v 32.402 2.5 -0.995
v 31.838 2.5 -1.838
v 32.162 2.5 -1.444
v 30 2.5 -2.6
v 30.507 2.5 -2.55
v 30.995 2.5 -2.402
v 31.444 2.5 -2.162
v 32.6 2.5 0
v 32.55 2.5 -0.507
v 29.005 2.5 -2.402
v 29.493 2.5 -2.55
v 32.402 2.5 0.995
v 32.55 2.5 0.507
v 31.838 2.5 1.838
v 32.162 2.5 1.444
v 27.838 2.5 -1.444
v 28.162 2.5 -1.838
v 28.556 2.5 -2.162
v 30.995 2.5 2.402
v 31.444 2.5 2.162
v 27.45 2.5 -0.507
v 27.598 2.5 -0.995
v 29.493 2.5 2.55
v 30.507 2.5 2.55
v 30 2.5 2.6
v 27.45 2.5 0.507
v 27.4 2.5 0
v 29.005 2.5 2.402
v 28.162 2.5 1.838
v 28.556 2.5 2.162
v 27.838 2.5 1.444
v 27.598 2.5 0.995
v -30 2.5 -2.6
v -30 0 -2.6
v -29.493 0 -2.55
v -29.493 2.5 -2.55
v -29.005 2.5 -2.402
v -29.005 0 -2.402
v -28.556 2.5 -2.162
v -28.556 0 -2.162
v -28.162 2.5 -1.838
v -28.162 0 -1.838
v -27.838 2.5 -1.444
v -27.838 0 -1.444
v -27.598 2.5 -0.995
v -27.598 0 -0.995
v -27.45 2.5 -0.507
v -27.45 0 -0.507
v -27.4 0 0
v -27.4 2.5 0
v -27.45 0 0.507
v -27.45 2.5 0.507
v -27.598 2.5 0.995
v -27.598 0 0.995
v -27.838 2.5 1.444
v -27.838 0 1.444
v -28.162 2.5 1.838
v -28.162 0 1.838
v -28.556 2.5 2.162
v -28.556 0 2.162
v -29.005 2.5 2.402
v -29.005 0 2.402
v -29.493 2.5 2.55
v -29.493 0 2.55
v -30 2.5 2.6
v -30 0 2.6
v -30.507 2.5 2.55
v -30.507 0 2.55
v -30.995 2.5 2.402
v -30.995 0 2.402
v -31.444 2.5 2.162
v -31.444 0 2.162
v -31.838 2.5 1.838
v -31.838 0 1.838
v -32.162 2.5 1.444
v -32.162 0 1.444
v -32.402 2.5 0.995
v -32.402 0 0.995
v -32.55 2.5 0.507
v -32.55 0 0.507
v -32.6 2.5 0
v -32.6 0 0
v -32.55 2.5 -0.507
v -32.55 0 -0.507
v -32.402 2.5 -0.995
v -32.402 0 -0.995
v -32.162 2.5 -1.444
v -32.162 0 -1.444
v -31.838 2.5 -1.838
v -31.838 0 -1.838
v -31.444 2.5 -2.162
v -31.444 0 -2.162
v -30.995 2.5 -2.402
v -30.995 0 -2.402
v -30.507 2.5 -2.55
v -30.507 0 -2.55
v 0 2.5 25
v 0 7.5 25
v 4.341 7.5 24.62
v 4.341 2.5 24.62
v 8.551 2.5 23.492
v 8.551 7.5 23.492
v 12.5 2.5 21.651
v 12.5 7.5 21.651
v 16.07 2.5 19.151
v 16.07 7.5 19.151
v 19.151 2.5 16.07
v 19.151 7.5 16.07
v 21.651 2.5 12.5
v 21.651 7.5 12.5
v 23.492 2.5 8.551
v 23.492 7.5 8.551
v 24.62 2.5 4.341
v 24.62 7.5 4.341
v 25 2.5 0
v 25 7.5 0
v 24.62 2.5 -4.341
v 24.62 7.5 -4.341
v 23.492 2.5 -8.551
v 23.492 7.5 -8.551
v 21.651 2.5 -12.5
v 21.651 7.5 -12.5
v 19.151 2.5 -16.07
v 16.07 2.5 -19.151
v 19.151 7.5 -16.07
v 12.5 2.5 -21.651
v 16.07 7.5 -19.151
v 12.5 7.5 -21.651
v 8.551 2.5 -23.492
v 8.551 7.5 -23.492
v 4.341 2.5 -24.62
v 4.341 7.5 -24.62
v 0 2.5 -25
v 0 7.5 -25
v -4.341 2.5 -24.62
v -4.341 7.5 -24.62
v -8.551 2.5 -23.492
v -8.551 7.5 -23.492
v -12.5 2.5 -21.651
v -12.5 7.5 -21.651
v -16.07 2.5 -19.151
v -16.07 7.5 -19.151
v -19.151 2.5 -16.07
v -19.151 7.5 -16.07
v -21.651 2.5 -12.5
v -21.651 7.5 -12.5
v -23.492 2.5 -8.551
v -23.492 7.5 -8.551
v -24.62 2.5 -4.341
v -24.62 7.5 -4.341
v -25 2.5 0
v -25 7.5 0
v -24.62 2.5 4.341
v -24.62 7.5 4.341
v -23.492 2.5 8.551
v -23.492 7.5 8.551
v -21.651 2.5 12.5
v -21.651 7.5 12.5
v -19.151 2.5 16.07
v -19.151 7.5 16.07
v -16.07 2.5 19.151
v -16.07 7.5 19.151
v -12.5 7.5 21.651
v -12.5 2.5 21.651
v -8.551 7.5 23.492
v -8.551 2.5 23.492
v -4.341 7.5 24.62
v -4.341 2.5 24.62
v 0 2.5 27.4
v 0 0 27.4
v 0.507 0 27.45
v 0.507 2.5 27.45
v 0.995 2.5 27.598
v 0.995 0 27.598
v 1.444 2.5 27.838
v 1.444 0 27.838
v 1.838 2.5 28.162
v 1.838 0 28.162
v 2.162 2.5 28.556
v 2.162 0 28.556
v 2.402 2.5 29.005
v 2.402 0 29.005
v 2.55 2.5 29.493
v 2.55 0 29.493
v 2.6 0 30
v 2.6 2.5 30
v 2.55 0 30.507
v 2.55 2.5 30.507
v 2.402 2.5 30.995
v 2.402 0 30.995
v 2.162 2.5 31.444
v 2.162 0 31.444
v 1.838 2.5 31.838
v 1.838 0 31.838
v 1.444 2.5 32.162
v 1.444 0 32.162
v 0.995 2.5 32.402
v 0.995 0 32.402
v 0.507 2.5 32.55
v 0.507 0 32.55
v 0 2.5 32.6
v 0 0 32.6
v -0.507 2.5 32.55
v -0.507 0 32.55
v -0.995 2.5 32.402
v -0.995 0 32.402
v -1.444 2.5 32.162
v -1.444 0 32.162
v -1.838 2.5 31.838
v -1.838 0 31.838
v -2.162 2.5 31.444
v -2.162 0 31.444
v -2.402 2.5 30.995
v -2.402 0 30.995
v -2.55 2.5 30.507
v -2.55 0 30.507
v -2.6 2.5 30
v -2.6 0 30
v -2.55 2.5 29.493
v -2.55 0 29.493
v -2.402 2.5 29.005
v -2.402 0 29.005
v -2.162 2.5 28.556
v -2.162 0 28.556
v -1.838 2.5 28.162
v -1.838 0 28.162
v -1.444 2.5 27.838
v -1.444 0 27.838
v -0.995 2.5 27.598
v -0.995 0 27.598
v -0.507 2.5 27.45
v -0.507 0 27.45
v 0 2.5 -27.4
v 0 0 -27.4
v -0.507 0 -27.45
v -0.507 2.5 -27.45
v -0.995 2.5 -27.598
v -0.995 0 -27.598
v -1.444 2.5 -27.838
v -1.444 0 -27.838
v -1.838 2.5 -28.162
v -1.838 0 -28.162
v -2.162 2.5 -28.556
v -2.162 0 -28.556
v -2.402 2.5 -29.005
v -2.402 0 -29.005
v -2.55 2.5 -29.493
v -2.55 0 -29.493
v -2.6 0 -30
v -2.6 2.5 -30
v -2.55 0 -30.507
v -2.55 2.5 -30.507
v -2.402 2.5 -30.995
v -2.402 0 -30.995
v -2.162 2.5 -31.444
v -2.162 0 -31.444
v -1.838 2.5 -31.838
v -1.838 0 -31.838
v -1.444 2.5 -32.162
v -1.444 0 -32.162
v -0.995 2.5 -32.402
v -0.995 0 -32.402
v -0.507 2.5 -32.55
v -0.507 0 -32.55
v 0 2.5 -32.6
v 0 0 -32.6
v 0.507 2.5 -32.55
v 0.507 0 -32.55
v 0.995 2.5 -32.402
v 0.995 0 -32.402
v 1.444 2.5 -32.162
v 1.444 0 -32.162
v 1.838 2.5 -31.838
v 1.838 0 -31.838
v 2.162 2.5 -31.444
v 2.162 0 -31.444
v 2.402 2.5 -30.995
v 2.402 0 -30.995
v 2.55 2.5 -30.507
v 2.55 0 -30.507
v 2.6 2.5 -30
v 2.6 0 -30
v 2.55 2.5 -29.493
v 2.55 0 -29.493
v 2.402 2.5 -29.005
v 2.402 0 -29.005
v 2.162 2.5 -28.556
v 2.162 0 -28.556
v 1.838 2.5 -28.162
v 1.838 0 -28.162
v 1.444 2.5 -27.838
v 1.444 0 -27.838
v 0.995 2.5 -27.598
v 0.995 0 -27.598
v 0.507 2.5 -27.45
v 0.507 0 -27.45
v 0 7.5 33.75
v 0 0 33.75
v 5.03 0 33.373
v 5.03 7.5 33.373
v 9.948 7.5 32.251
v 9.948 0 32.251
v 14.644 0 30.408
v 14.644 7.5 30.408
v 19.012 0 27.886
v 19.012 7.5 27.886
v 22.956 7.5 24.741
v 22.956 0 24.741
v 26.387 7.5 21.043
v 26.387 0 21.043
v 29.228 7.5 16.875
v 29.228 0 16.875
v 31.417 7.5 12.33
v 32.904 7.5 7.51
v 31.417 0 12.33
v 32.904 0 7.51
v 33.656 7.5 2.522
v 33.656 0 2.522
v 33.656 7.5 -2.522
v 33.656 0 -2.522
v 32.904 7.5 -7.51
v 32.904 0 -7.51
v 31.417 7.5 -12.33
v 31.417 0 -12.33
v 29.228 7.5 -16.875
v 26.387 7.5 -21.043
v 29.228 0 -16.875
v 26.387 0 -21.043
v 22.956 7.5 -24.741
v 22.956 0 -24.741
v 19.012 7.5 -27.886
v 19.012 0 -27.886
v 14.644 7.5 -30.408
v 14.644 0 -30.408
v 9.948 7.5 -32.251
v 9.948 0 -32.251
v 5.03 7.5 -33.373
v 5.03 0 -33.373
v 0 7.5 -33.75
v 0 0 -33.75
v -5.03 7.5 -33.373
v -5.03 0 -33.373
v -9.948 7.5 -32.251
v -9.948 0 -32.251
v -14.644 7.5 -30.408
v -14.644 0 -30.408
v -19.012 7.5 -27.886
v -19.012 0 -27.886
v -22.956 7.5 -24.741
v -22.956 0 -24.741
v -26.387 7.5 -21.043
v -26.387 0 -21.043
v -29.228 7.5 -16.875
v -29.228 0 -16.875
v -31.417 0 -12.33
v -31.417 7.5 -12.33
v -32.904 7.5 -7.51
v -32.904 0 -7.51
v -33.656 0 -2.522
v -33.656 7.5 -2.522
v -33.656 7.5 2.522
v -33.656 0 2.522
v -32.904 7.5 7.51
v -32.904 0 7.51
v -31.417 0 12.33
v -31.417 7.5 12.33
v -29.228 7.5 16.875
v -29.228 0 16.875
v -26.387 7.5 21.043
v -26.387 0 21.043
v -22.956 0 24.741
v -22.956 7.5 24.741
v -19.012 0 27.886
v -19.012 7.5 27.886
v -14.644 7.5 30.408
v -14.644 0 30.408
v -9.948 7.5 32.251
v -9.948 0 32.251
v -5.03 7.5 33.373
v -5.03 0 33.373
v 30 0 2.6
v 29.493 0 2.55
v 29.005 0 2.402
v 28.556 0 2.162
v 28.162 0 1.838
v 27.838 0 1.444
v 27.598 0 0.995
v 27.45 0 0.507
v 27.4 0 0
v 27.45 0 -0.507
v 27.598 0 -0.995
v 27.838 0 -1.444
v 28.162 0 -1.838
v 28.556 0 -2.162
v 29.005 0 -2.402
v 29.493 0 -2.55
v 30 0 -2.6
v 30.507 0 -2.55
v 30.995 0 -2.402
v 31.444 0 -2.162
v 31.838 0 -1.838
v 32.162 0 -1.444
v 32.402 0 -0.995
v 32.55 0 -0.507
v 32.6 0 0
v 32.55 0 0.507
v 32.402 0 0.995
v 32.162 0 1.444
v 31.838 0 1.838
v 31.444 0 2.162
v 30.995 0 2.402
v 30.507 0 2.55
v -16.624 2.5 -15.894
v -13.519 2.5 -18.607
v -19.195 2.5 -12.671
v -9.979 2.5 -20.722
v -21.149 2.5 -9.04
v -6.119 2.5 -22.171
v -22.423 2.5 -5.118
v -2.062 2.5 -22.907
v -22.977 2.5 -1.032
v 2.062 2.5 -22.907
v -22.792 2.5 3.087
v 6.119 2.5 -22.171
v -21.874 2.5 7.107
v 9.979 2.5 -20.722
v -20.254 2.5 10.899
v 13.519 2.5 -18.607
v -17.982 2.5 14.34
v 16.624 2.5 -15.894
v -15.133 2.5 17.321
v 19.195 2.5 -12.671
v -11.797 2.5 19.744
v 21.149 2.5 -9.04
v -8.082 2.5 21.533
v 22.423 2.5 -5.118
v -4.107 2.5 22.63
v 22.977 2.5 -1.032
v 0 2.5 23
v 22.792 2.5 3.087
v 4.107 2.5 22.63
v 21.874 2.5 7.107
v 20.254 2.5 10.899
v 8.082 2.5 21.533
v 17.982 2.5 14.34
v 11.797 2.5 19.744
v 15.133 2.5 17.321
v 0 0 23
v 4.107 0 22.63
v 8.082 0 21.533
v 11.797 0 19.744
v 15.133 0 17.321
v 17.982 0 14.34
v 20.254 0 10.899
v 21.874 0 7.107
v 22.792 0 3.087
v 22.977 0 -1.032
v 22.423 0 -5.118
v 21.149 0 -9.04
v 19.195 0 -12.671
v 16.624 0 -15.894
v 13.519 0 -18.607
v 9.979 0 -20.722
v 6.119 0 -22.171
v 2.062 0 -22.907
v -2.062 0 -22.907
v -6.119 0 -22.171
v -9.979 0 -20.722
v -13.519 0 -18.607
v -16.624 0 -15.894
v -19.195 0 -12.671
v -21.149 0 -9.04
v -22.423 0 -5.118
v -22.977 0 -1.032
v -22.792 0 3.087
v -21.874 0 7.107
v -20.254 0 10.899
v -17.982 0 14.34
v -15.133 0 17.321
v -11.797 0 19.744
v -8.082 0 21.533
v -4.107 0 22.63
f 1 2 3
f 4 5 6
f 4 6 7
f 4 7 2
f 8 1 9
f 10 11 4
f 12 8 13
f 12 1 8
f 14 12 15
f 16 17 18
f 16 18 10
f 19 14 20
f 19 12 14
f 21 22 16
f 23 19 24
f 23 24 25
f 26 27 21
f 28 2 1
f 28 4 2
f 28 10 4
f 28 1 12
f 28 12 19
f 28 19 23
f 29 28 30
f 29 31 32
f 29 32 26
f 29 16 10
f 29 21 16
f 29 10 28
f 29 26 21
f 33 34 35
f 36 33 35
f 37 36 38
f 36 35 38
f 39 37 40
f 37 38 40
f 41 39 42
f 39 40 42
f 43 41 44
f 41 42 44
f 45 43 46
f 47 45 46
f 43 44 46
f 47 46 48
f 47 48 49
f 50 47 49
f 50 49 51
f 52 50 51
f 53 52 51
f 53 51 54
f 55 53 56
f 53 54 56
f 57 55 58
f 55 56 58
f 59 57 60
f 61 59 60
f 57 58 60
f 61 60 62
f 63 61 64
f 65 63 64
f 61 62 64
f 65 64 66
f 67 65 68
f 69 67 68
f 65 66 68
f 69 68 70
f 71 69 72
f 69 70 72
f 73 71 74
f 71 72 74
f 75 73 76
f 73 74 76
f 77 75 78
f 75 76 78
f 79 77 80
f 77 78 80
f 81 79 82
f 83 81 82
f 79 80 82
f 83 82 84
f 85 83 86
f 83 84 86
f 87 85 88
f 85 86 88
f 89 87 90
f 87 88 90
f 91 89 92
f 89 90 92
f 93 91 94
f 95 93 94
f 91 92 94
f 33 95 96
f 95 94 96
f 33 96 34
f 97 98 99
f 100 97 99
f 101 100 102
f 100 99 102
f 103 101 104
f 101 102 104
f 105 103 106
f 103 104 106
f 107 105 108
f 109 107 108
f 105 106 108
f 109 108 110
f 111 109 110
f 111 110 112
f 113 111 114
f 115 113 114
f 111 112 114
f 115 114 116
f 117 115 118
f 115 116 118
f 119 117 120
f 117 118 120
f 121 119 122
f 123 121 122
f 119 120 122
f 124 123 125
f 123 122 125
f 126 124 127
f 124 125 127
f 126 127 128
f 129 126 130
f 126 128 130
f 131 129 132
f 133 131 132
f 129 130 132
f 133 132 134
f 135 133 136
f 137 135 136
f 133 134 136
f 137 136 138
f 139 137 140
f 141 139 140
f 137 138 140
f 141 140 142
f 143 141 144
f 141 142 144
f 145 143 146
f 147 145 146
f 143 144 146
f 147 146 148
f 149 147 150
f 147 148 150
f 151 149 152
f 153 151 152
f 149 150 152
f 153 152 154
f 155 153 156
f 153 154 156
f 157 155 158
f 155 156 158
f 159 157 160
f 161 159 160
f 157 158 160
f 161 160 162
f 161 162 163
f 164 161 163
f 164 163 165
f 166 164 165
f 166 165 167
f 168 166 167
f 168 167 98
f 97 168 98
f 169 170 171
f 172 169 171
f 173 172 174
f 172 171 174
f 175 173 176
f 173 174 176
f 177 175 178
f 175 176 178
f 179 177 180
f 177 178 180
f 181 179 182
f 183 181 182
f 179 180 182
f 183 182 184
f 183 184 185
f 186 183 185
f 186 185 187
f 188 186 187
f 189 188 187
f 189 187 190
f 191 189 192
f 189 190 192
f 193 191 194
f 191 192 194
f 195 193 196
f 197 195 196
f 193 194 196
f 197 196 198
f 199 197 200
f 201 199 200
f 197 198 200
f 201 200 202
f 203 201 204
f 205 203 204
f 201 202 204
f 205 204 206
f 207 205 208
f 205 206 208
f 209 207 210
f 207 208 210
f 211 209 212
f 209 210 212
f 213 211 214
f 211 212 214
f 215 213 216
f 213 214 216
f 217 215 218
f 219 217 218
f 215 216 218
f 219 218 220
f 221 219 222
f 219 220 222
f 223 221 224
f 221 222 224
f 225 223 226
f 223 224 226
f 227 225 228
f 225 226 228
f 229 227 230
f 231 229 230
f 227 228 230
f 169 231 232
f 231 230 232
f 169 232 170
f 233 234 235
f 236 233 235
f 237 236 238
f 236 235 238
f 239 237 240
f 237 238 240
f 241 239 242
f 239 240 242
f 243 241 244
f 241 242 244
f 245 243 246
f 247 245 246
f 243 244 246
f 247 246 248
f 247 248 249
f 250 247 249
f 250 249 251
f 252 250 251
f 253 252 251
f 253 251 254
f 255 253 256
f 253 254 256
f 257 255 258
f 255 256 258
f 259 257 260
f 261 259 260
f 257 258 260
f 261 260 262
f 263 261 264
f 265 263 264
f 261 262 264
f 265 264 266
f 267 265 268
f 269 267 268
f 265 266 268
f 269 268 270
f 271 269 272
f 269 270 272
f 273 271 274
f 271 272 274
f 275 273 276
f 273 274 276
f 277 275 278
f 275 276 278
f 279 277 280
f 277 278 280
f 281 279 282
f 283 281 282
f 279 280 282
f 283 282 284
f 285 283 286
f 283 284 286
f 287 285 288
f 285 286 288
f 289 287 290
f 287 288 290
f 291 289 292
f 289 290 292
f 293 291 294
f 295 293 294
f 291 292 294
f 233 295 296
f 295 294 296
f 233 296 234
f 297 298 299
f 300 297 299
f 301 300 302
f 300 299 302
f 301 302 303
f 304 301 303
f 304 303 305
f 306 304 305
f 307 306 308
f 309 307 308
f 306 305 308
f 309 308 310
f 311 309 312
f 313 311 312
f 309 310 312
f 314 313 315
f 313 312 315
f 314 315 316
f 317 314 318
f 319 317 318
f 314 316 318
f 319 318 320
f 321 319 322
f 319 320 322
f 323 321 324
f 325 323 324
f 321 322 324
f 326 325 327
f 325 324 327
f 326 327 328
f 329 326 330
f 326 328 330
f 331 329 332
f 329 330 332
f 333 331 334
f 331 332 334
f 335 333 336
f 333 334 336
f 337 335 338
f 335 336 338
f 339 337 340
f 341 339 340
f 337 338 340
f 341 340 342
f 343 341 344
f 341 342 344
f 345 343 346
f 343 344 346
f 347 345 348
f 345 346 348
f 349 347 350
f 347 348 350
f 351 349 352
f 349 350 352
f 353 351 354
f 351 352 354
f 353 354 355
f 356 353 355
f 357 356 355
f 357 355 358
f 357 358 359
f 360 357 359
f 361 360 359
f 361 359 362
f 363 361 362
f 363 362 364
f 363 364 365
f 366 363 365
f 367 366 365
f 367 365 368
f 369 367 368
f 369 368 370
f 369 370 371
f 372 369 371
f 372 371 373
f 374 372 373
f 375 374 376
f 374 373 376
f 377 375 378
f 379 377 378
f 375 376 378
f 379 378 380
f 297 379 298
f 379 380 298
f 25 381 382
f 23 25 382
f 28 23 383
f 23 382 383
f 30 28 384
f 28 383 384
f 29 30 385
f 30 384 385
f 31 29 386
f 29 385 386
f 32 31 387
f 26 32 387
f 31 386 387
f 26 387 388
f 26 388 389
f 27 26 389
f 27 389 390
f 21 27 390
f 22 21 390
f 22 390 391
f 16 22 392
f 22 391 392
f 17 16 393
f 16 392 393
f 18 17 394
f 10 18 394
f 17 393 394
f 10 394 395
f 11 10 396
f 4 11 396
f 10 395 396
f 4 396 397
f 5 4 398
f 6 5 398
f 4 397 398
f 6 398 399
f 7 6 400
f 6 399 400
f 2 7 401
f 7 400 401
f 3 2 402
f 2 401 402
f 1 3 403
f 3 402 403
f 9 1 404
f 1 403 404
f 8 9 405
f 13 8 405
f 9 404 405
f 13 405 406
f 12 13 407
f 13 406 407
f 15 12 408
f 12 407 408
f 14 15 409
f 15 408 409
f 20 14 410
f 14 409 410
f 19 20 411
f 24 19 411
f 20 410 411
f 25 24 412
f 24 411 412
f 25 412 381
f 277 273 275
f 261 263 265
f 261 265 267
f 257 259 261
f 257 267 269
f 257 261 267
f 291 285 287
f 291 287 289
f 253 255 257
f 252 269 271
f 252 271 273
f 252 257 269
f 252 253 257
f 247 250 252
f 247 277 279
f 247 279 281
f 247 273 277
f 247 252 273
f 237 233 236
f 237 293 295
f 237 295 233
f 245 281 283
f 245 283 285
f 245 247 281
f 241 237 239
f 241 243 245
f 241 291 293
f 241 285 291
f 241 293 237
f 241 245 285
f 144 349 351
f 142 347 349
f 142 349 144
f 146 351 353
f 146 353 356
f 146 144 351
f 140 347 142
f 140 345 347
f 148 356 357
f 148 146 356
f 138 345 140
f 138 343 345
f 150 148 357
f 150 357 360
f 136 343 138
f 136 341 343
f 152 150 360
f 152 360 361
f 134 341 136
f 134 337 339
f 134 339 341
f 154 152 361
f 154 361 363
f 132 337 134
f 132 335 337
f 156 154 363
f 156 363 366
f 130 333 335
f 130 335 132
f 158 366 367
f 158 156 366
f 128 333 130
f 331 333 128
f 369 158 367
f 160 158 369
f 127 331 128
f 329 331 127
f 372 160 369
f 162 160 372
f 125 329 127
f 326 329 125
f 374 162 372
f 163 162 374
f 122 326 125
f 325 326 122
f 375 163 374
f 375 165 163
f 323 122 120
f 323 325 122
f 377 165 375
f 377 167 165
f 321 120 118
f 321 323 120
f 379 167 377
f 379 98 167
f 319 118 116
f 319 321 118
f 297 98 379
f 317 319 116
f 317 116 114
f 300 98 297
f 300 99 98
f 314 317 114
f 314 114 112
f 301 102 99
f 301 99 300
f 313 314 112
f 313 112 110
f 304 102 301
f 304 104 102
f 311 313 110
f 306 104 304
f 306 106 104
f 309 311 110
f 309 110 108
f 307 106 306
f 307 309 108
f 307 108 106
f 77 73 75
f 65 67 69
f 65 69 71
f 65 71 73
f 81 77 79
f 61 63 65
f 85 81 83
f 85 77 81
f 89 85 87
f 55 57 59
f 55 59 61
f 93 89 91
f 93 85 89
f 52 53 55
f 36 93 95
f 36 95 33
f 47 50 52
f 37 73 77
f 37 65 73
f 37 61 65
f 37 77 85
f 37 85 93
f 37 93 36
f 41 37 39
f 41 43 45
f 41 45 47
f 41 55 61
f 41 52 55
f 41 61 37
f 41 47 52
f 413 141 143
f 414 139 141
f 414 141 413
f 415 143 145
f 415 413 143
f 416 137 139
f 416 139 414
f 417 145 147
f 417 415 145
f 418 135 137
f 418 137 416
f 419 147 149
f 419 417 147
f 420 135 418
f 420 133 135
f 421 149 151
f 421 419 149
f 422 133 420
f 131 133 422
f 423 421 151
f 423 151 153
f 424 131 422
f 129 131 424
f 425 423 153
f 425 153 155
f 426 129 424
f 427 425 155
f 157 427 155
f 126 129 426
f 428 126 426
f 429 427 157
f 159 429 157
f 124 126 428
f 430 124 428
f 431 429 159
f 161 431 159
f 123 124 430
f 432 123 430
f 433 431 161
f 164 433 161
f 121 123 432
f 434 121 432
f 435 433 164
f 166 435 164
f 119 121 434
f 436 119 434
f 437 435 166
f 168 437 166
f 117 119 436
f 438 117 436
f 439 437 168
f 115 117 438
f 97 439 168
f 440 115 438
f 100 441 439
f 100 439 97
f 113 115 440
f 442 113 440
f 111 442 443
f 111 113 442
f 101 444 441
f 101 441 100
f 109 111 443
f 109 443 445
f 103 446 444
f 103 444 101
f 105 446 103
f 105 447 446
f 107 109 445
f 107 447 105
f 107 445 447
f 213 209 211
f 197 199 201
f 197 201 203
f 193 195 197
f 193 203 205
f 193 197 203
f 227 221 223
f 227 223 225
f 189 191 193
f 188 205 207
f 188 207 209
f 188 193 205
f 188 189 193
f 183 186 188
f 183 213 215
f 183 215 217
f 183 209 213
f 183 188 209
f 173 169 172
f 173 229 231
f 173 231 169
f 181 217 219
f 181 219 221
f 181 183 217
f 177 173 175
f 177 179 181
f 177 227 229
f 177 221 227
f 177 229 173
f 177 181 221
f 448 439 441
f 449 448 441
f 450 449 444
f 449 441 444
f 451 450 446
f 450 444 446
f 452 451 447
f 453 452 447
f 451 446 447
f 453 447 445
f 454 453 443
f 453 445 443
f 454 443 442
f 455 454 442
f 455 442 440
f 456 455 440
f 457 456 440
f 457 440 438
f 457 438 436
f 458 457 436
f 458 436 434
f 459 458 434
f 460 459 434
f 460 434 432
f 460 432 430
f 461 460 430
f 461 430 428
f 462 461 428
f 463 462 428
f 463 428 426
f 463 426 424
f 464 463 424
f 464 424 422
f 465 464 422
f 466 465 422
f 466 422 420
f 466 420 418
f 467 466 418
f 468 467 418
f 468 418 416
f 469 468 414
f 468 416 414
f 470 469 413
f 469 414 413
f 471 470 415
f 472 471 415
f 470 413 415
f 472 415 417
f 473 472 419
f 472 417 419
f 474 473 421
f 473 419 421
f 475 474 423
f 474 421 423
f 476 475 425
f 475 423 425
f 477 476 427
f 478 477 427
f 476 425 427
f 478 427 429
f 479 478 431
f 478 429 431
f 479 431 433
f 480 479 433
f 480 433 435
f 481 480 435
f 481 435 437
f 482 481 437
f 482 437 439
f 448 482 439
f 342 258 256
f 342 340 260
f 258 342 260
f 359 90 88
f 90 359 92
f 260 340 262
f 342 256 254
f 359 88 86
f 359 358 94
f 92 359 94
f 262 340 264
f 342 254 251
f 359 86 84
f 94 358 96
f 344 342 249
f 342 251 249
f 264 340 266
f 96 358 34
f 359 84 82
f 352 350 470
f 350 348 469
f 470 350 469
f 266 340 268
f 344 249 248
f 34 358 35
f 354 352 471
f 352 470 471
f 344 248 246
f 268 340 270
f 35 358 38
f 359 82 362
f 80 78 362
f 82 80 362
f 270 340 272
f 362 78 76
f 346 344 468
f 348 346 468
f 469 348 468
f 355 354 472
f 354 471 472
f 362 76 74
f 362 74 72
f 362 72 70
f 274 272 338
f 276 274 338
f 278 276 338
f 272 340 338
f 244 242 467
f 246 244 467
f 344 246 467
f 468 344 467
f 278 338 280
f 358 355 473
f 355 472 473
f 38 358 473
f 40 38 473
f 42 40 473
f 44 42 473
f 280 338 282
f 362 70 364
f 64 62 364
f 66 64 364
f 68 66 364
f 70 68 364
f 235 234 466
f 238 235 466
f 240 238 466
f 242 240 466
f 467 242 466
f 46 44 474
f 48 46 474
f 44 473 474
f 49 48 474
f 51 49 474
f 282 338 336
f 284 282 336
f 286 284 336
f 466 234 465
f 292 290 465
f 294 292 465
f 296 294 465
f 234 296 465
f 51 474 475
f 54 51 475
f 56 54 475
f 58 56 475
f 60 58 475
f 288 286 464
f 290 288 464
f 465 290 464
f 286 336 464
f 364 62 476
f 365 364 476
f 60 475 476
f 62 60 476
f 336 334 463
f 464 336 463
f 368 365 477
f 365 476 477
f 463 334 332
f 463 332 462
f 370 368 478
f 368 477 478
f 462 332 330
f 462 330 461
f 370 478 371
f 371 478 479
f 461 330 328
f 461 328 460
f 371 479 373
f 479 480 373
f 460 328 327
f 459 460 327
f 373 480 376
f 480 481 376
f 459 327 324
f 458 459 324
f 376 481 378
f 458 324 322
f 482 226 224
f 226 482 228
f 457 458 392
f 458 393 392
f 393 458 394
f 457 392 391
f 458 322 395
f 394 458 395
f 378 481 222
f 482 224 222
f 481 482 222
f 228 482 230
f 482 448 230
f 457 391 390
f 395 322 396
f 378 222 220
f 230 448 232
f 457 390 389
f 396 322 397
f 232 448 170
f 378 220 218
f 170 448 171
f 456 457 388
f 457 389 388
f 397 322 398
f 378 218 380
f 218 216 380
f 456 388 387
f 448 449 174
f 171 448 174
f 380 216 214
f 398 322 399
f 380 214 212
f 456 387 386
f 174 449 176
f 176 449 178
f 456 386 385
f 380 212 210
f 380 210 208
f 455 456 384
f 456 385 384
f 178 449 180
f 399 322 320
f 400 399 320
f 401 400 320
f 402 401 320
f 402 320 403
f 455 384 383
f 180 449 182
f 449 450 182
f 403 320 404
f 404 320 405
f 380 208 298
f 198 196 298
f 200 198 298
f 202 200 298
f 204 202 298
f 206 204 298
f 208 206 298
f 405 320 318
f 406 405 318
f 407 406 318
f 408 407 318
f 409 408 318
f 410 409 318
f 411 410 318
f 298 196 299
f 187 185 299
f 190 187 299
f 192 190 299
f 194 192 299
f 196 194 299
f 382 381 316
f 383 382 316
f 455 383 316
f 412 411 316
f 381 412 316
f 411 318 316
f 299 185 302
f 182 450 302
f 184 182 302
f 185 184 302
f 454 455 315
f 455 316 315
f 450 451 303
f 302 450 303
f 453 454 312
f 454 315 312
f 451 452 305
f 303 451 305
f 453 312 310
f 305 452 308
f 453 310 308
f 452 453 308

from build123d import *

# Parameters (mm, degrees)
SKETCH1_R           = 33.75
BOSS_EXTRUDE1_DEPTH = 7.5
SKETCH2_R           = 2.6
CUT_EXTRUDE1_DEPTH  = 2.5
SKETCH3_R           = 23
CUT_EXTRUDE2_DEPTH  = 49.315370225
SKETCH4_R           = 25
CUT_EXTRUDE3_DEPTH  = 5


with BuildPart() as part:
    # Sketch1 → Boss-Extrude1 (new body)
    with BuildSketch(Plane(origin=(0, 0, 0), x_dir=(1, 0, 0), z_dir=(0, 1, 0))):
        with Locations(Location((0, 0, 0), (0, 0, 270))):
            Circle(SKETCH1_R)
    extrude(amount=BOSS_EXTRUDE1_DEPTH)

    # Sketch2 → Cut-Extrude1 (cut)
    with BuildSketch(Plane.XZ):
        with Locations(Location((-30, 0, 0), (0, 0, 270))):
            Circle(SKETCH2_R)
        with Locations(Location((30, 0, 0), (0, 0, 90))):
            Circle(SKETCH2_R)
        with Locations(Location((0, -30, 0), (0, 0, 90))):
            Circle(SKETCH2_R)
        with Locations(Location((0, 30, 0), (0, 0, 270))):
            Circle(SKETCH2_R)
    extrude(amount=-CUT_EXTRUDE1_DEPTH, mode=Mode.SUBTRACT)

    # Sketch3 → Cut-Extrude2 (cut, through all)
    with BuildSketch(Plane(origin=(0, 7.5, 0), x_dir=(1, 0, 0), z_dir=(0, 1, 0))):
        with Locations(Location((0, 0, 0), (0, 0, 270))):
            Circle(SKETCH3_R)
    extrude(amount=-CUT_EXTRUDE2_DEPTH, mode=Mode.SUBTRACT)

    # Sketch4 → Cut-Extrude3 (cut)
    with BuildSketch(Plane(origin=(0, 7.5, 0), x_dir=(1, 0, 0), z_dir=(0, 1, 0))):
        with Locations(Location((0, 0, 0), (0, 0, 270))):
            Circle(SKETCH4_R)
    extrude(amount=-CUT_EXTRUDE3_DEPTH, mode=Mode.SUBTRACT)


solid = part.part
